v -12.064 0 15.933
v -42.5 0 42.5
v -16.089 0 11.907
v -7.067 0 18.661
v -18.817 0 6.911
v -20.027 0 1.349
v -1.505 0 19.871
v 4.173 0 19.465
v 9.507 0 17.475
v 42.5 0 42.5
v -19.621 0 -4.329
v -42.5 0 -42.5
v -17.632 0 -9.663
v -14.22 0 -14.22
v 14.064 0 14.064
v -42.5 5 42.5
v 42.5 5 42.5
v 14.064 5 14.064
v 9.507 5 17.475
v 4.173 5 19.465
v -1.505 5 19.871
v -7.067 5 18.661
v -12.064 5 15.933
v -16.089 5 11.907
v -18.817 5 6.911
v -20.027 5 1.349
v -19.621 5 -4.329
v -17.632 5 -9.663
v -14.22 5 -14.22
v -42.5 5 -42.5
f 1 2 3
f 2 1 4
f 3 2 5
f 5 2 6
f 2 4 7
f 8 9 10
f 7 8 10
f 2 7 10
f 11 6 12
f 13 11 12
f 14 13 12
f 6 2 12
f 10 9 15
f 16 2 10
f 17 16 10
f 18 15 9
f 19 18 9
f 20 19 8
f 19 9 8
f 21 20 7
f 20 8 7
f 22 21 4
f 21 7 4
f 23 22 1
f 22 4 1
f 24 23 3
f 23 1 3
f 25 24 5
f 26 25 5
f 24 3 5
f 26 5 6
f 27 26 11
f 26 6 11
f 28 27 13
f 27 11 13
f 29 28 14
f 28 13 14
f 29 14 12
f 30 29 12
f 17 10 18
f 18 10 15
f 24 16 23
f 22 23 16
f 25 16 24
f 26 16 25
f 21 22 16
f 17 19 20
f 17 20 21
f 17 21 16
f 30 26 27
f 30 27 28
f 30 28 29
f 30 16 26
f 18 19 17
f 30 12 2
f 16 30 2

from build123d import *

# Parameters (mm, degrees)
BOSS_EXTRU_1_DEPTH = 5


with BuildPart() as part:
    # Esquisse1 → Boss.-Extru.1 (new body)
    with BuildSketch(Plane(origin=(0, 0, 0), x_dir=(1, 0, 0), z_dir=(0, 1, 0))):
        with BuildLine():
            Line((-14.220317816, 14.220317816), (-42.5, 42.5))
            Line((-42.5, 42.5), (-42.5, -42.5))
            Line((-42.5, -42.5), (42.5, -42.5))
            Line((42.5, -42.5), (14.063953431, -14.063953431))
            ThreePointArc((14.063953431, -14.063953431), (-14.220317816, -14.063953431), (-14.220317816, 14.220317816))
        make_face()
    extrude(amount=BOSS_EXTRU_1_DEPTH)


solid = part.part
